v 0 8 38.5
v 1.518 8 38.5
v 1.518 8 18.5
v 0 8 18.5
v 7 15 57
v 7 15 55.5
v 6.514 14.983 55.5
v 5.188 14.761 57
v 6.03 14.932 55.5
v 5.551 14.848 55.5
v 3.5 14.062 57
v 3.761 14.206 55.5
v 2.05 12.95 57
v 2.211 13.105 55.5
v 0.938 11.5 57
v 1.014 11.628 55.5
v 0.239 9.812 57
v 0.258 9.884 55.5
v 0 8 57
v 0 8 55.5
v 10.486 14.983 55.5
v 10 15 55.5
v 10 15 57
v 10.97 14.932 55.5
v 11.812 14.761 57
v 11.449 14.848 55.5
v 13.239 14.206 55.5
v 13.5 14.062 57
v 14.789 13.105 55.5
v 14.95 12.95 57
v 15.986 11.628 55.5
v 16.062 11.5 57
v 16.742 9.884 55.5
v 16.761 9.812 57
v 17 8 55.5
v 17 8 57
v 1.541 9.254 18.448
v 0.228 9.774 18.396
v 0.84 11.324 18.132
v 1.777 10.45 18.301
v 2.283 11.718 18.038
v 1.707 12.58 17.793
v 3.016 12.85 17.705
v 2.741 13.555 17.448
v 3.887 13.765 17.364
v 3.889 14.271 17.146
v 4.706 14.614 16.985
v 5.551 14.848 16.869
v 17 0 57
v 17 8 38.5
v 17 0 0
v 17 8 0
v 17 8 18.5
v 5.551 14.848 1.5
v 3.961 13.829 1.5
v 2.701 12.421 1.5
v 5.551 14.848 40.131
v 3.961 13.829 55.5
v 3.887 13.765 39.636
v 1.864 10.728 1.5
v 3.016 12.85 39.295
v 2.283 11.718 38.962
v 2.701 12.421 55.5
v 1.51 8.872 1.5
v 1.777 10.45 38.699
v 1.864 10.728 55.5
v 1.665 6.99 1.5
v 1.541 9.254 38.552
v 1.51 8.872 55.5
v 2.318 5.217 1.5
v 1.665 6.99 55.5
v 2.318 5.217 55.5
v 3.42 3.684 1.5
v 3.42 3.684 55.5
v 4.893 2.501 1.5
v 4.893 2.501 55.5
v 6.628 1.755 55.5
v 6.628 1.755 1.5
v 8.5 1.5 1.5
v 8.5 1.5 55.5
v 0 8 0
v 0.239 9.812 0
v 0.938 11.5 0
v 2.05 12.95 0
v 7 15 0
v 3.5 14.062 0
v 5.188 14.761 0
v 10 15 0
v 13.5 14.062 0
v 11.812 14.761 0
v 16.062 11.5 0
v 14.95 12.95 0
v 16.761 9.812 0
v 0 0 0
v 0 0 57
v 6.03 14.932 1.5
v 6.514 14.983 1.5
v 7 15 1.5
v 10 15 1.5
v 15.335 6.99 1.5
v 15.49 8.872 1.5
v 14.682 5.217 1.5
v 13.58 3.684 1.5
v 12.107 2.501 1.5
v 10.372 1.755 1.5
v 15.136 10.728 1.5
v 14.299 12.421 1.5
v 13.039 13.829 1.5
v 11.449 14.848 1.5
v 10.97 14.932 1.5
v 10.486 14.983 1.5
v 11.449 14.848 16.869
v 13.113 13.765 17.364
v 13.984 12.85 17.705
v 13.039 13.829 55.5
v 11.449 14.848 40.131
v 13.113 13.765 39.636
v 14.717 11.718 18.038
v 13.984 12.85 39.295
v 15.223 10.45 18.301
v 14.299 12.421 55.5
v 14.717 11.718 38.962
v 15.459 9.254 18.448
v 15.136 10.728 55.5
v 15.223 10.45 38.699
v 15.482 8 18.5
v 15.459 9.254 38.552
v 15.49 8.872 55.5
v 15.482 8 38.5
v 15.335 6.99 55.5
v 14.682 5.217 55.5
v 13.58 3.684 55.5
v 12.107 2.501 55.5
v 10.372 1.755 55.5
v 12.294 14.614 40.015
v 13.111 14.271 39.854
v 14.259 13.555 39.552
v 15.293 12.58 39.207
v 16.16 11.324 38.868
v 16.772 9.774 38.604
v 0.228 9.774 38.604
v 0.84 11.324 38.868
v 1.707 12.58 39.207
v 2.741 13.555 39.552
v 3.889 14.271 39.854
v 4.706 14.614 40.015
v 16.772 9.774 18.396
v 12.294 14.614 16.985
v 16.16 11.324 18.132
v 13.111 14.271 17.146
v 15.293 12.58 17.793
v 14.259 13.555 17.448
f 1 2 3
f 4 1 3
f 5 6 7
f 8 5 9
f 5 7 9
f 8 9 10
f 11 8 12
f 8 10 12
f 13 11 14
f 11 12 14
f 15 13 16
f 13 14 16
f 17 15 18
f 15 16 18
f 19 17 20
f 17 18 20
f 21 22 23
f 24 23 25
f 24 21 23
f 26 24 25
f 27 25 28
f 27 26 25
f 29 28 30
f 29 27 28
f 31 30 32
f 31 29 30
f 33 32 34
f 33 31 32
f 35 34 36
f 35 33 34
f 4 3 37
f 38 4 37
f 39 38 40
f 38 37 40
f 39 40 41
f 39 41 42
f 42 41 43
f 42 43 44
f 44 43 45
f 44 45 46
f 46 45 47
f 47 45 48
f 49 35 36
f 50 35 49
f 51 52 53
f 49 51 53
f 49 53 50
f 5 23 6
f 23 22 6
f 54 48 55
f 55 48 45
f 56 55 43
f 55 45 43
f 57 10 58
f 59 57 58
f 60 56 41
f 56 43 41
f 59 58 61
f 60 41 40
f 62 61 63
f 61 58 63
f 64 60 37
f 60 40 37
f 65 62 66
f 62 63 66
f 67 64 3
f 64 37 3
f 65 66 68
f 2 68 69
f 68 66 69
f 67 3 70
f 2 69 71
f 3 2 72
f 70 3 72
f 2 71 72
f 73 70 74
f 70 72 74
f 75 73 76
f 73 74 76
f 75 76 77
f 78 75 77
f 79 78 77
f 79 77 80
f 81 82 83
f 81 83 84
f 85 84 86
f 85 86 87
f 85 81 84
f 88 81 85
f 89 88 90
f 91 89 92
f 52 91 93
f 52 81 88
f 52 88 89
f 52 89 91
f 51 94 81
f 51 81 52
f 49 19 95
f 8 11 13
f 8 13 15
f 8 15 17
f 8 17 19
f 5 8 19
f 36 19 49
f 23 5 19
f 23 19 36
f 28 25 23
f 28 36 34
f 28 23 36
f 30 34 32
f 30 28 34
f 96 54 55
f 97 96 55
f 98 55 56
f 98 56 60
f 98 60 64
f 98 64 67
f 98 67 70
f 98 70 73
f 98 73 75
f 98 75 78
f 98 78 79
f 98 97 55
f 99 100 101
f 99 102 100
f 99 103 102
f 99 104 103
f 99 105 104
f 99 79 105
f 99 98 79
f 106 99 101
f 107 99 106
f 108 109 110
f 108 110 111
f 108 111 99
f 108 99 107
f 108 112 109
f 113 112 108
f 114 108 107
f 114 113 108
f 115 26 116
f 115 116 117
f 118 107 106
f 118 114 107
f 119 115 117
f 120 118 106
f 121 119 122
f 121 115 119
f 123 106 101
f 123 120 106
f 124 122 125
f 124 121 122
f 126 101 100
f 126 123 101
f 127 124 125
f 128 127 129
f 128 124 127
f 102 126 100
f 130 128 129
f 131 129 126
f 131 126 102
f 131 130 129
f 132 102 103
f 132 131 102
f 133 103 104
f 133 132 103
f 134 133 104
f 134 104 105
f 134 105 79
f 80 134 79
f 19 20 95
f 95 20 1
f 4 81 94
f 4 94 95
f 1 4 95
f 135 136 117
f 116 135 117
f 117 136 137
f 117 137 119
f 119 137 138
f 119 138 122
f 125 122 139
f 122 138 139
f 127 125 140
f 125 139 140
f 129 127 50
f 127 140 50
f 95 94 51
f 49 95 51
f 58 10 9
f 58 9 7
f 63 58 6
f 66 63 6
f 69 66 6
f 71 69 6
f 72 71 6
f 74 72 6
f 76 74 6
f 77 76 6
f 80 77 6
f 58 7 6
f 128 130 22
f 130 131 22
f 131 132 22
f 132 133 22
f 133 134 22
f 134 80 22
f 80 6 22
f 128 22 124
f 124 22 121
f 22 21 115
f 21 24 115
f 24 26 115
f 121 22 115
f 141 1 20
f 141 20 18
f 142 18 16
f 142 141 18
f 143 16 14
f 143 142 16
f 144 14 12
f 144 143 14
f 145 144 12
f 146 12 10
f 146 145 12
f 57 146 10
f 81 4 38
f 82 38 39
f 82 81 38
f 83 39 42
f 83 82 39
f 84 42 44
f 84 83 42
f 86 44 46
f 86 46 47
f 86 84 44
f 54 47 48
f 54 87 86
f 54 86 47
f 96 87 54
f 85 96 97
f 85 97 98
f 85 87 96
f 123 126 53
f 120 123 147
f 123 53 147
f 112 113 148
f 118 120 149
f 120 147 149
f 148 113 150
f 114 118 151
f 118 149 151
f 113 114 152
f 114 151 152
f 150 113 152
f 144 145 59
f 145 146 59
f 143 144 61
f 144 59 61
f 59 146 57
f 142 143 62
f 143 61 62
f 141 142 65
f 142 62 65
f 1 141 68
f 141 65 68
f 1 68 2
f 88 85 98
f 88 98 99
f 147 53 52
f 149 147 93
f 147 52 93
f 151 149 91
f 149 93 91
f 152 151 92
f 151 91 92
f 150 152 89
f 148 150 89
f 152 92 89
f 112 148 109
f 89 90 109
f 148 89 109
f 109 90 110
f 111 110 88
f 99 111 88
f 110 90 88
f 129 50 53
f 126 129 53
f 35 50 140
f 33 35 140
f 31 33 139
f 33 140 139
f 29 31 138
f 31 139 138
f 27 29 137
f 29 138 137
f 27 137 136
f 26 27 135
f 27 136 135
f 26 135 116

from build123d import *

# Parameters (mm, degrees)
SKETCH1_W           = 47
SKETCH1_H           = 55.5
BOSS_EXTRUDE1_DEPTH = 15
CUT_EXTRUDE4_DEPTH  = 54
FILLET1_R           = 7
FILLET2_R           = 7
SKETCH3_W           = 4.401923789
SKETCH3_H           = 6.5
CUT_EXTRUDE5_DEPTH  = 54
SKETCH4_W           = 1
SKETCH4_H           = 1
CUT_EXTRUDE6_DEPTH  = 54
CUT_EXTRUDE7_DEPTH  = 20
CUT_EXTRUDE8_DEPTH  = 5
BOSS_EXTRUDE3_DEPTH = 1.5
CUT_EXTRUDE9_DEPTH  = 57
SKETCH11_W          = 23.5
SKETCH11_H          = 15
CUT_EXTRUDE10_DEPTH = 68.067130548
SKETCH12_W          = 7.286258621
SKETCH12_H          = 11.383570635
BOSS_EXTRUDE4_DEPTH = 10
CUT_EXTRUDE11_DEPTH = 62.343296292


with BuildPart() as part:
    # Sketch1 → Boss-Extrude1 (new body)
    with BuildSketch(Plane(origin=(0, 0, 0), x_dir=(1, 0, 0), z_dir=(0, 1, 0))):
        with Locations((23.5, -27.75)):
            Rectangle(SKETCH1_W, SKETCH1_H)
    extrude(amount=BOSS_EXTRUDE1_DEPTH)

    # Sketch2 → Cut-Extrude4 (cut)
    with BuildSketch(Plane.XY.offset(55.5)):
        with BuildLine():
            Line((11.098076211, 15), (5.901923789, 15))
            ThreePointArc((5.901923789, 15), (8.5, 1.5), (11.098076211, 15))
        make_face()
        with BuildLine():
            Line((26.098076211, 15), (20.901923789, 15))
            ThreePointArc((20.901923789, 15), (23.5, 1.5), (26.098076211, 15))
        make_face()
        with BuildLine():
            ThreePointArc((35.901923789, 15), (38.5, 1.5), (41.098076211, 15))
            Line((41.098076211, 15), (35.901923789, 15))
        make_face()
    extrude(amount=-CUT_EXTRUDE4_DEPTH, mode=Mode.SUBTRACT)

    # Fillet1
    fillet1_edges = [part.edges().sort_by_distance(p)[0] for p in [
        (47, 15, 27.75),
    ]]
    fillet(fillet1_edges, radius=FILLET1_R)

    # Fillet2
    fillet2_edges = [part.edges().sort_by_distance(p)[0] for p in [
        (0, 15, 27.75),
    ]]
    fillet(fillet2_edges, radius=FILLET2_R)

    # Sketch3 → Cut-Extrude5 (cut)
    with BuildSketch(Plane.XY.offset(55.5)):
        with Locations((28.299038106, 11.75)):
            Rectangle(SKETCH3_W, SKETCH3_H)
        with Locations((33.700961895, 11.75)):
            Rectangle(SKETCH3_W, SKETCH3_H)
        with Locations((13.299038106, 11.75)):
            Rectangle(SKETCH3_W, SKETCH3_H)
        with Locations((18.700961895, 11.75)):
            Rectangle(SKETCH3_W, SKETCH3_H)
    extrude(amount=-CUT_EXTRUDE5_DEPTH, mode=Mode.SUBTRACT)

    # Sketch4 → Cut-Extrude6 (cut)
    with BuildSketch(Plane.XY.offset(55.5)):
        with Locations((16, 14.5)):
            Rectangle(SKETCH4_W, SKETCH4_H)
        with Locations((31, 14.5)):
            Rectangle(SKETCH4_W, SKETCH4_H)
    extrude(amount=-CUT_EXTRUDE6_DEPTH, mode=Mode.SUBTRACT)

    # Sketch5 → Cut-Extrude7 (cut)
    with BuildSketch(Plane.ZY.offset(-15.5)):
        Polygon((6.5, 14), (50.5, 14), (40.5, 7), (16.5, 7), align=None)
    extrude(amount=-CUT_EXTRUDE7_DEPTH, mode=Mode.SUBTRACT)

    # Sketch5<2> → Cut-Extrude8 (cut)
    with BuildSketch(Plane.ZY.offset(-15.5)):
        Polygon((6.5, 14), (50.5, 14), (40.5, 7), (16.5, 7), align=None)
    extrude(amount=CUT_EXTRUDE8_DEPTH, mode=Mode.SUBTRACT)

    # Sketch6 → Boss-Extrude3 (add)
    with BuildSketch(Plane.XY.offset(55.5)):
        with BuildLine():
            Line((0, 0), (47, 0))
            Line((47, 0), (47, 8))
            ThreePointArc((47, 8), (44.949747468, 12.949747468), (40, 15))
            Line((40, 15), (7, 15))
            ThreePointArc((7, 15), (2.050252532, 12.949747468), (0, 8))
            Line((0, 8), (0, 0))
        make_face()
    extrude(amount=BOSS_EXTRUDE3_DEPTH)

    # Sketch7 → Cut-Extrude9 (cut)
    with BuildSketch(Plane.XY.offset(57)):
        Polygon((16, 8), (16, 15), (47, 15), (47, 0), (16, 0), align=None)
    extrude(amount=-CUT_EXTRUDE9_DEPTH, mode=Mode.SUBTRACT)

    # Mirror1: part across plane


with BuildPart() as part_1:
    add(part.part)
    add(part.part.mirror(Plane(origin=(16, 8, 0), x_dir=(0, 0, 1), z_dir=(-1, 0, 0))))

    # Sketch11 → Cut-Extrude10 (cut, through all)
    with BuildSketch(Plane.XY.offset(57)):
        with Locations((20.25, 7.5)):
            Rectangle(SKETCH11_W, SKETCH11_H)
    extrude(amount=-CUT_EXTRUDE10_DEPTH, mode=Mode.SUBTRACT)


with BuildPart() as body_2:
    # Sketch12 → Boss-Extrude4 (new body)
    with BuildSketch(Plane.XY.offset(57)):
        with Locations((18.969587134, 9.308214683)):
            Rectangle(SKETCH12_W, SKETCH12_H)
    extrude(amount=BOSS_EXTRUDE4_DEPTH)


with BuildPart() as body_3:
    # Mirror2: mirrored copy
    add(part_1.part.mirror(Plane(origin=(8.5, 15, 0), x_dir=(0, 0, 1), z_dir=(-1, 0, 0))))


with BuildPart() as part_2:
    add(part_1.part)

    # Combine1: union body 3
    add(body_3.part)

    # Sketch13 → Cut-Extrude11 (cut, through all)
    with BuildSketch(Plane(origin=(17, 0, 0), x_dir=(0, 0, -1), z_dir=(1, 0, 0))):
        with BuildLine():
            Line((-38.5, 8), (-18.5, 8))
            ThreePointArc((-18.5, 8), (-15.125235033, 17.548269454), (-6.5, 22.855227978))
            Line((-6.5, 22.855227978), (-18.5, 22.855227978))
            Line((-18.5, 22.855227978), (-38.5, 22.855227978))
            Line((-38.5, 22.855227978), (-50.5, 22.855227978))
            ThreePointArc((-50.5, 22.855227978), (-41.874764967, 17.548269454), (-38.5, 8))
        make_face()
    extrude(amount=-CUT_EXTRUDE11_DEPTH, mode=Mode.SUBTRACT)


solid = part_2.part
